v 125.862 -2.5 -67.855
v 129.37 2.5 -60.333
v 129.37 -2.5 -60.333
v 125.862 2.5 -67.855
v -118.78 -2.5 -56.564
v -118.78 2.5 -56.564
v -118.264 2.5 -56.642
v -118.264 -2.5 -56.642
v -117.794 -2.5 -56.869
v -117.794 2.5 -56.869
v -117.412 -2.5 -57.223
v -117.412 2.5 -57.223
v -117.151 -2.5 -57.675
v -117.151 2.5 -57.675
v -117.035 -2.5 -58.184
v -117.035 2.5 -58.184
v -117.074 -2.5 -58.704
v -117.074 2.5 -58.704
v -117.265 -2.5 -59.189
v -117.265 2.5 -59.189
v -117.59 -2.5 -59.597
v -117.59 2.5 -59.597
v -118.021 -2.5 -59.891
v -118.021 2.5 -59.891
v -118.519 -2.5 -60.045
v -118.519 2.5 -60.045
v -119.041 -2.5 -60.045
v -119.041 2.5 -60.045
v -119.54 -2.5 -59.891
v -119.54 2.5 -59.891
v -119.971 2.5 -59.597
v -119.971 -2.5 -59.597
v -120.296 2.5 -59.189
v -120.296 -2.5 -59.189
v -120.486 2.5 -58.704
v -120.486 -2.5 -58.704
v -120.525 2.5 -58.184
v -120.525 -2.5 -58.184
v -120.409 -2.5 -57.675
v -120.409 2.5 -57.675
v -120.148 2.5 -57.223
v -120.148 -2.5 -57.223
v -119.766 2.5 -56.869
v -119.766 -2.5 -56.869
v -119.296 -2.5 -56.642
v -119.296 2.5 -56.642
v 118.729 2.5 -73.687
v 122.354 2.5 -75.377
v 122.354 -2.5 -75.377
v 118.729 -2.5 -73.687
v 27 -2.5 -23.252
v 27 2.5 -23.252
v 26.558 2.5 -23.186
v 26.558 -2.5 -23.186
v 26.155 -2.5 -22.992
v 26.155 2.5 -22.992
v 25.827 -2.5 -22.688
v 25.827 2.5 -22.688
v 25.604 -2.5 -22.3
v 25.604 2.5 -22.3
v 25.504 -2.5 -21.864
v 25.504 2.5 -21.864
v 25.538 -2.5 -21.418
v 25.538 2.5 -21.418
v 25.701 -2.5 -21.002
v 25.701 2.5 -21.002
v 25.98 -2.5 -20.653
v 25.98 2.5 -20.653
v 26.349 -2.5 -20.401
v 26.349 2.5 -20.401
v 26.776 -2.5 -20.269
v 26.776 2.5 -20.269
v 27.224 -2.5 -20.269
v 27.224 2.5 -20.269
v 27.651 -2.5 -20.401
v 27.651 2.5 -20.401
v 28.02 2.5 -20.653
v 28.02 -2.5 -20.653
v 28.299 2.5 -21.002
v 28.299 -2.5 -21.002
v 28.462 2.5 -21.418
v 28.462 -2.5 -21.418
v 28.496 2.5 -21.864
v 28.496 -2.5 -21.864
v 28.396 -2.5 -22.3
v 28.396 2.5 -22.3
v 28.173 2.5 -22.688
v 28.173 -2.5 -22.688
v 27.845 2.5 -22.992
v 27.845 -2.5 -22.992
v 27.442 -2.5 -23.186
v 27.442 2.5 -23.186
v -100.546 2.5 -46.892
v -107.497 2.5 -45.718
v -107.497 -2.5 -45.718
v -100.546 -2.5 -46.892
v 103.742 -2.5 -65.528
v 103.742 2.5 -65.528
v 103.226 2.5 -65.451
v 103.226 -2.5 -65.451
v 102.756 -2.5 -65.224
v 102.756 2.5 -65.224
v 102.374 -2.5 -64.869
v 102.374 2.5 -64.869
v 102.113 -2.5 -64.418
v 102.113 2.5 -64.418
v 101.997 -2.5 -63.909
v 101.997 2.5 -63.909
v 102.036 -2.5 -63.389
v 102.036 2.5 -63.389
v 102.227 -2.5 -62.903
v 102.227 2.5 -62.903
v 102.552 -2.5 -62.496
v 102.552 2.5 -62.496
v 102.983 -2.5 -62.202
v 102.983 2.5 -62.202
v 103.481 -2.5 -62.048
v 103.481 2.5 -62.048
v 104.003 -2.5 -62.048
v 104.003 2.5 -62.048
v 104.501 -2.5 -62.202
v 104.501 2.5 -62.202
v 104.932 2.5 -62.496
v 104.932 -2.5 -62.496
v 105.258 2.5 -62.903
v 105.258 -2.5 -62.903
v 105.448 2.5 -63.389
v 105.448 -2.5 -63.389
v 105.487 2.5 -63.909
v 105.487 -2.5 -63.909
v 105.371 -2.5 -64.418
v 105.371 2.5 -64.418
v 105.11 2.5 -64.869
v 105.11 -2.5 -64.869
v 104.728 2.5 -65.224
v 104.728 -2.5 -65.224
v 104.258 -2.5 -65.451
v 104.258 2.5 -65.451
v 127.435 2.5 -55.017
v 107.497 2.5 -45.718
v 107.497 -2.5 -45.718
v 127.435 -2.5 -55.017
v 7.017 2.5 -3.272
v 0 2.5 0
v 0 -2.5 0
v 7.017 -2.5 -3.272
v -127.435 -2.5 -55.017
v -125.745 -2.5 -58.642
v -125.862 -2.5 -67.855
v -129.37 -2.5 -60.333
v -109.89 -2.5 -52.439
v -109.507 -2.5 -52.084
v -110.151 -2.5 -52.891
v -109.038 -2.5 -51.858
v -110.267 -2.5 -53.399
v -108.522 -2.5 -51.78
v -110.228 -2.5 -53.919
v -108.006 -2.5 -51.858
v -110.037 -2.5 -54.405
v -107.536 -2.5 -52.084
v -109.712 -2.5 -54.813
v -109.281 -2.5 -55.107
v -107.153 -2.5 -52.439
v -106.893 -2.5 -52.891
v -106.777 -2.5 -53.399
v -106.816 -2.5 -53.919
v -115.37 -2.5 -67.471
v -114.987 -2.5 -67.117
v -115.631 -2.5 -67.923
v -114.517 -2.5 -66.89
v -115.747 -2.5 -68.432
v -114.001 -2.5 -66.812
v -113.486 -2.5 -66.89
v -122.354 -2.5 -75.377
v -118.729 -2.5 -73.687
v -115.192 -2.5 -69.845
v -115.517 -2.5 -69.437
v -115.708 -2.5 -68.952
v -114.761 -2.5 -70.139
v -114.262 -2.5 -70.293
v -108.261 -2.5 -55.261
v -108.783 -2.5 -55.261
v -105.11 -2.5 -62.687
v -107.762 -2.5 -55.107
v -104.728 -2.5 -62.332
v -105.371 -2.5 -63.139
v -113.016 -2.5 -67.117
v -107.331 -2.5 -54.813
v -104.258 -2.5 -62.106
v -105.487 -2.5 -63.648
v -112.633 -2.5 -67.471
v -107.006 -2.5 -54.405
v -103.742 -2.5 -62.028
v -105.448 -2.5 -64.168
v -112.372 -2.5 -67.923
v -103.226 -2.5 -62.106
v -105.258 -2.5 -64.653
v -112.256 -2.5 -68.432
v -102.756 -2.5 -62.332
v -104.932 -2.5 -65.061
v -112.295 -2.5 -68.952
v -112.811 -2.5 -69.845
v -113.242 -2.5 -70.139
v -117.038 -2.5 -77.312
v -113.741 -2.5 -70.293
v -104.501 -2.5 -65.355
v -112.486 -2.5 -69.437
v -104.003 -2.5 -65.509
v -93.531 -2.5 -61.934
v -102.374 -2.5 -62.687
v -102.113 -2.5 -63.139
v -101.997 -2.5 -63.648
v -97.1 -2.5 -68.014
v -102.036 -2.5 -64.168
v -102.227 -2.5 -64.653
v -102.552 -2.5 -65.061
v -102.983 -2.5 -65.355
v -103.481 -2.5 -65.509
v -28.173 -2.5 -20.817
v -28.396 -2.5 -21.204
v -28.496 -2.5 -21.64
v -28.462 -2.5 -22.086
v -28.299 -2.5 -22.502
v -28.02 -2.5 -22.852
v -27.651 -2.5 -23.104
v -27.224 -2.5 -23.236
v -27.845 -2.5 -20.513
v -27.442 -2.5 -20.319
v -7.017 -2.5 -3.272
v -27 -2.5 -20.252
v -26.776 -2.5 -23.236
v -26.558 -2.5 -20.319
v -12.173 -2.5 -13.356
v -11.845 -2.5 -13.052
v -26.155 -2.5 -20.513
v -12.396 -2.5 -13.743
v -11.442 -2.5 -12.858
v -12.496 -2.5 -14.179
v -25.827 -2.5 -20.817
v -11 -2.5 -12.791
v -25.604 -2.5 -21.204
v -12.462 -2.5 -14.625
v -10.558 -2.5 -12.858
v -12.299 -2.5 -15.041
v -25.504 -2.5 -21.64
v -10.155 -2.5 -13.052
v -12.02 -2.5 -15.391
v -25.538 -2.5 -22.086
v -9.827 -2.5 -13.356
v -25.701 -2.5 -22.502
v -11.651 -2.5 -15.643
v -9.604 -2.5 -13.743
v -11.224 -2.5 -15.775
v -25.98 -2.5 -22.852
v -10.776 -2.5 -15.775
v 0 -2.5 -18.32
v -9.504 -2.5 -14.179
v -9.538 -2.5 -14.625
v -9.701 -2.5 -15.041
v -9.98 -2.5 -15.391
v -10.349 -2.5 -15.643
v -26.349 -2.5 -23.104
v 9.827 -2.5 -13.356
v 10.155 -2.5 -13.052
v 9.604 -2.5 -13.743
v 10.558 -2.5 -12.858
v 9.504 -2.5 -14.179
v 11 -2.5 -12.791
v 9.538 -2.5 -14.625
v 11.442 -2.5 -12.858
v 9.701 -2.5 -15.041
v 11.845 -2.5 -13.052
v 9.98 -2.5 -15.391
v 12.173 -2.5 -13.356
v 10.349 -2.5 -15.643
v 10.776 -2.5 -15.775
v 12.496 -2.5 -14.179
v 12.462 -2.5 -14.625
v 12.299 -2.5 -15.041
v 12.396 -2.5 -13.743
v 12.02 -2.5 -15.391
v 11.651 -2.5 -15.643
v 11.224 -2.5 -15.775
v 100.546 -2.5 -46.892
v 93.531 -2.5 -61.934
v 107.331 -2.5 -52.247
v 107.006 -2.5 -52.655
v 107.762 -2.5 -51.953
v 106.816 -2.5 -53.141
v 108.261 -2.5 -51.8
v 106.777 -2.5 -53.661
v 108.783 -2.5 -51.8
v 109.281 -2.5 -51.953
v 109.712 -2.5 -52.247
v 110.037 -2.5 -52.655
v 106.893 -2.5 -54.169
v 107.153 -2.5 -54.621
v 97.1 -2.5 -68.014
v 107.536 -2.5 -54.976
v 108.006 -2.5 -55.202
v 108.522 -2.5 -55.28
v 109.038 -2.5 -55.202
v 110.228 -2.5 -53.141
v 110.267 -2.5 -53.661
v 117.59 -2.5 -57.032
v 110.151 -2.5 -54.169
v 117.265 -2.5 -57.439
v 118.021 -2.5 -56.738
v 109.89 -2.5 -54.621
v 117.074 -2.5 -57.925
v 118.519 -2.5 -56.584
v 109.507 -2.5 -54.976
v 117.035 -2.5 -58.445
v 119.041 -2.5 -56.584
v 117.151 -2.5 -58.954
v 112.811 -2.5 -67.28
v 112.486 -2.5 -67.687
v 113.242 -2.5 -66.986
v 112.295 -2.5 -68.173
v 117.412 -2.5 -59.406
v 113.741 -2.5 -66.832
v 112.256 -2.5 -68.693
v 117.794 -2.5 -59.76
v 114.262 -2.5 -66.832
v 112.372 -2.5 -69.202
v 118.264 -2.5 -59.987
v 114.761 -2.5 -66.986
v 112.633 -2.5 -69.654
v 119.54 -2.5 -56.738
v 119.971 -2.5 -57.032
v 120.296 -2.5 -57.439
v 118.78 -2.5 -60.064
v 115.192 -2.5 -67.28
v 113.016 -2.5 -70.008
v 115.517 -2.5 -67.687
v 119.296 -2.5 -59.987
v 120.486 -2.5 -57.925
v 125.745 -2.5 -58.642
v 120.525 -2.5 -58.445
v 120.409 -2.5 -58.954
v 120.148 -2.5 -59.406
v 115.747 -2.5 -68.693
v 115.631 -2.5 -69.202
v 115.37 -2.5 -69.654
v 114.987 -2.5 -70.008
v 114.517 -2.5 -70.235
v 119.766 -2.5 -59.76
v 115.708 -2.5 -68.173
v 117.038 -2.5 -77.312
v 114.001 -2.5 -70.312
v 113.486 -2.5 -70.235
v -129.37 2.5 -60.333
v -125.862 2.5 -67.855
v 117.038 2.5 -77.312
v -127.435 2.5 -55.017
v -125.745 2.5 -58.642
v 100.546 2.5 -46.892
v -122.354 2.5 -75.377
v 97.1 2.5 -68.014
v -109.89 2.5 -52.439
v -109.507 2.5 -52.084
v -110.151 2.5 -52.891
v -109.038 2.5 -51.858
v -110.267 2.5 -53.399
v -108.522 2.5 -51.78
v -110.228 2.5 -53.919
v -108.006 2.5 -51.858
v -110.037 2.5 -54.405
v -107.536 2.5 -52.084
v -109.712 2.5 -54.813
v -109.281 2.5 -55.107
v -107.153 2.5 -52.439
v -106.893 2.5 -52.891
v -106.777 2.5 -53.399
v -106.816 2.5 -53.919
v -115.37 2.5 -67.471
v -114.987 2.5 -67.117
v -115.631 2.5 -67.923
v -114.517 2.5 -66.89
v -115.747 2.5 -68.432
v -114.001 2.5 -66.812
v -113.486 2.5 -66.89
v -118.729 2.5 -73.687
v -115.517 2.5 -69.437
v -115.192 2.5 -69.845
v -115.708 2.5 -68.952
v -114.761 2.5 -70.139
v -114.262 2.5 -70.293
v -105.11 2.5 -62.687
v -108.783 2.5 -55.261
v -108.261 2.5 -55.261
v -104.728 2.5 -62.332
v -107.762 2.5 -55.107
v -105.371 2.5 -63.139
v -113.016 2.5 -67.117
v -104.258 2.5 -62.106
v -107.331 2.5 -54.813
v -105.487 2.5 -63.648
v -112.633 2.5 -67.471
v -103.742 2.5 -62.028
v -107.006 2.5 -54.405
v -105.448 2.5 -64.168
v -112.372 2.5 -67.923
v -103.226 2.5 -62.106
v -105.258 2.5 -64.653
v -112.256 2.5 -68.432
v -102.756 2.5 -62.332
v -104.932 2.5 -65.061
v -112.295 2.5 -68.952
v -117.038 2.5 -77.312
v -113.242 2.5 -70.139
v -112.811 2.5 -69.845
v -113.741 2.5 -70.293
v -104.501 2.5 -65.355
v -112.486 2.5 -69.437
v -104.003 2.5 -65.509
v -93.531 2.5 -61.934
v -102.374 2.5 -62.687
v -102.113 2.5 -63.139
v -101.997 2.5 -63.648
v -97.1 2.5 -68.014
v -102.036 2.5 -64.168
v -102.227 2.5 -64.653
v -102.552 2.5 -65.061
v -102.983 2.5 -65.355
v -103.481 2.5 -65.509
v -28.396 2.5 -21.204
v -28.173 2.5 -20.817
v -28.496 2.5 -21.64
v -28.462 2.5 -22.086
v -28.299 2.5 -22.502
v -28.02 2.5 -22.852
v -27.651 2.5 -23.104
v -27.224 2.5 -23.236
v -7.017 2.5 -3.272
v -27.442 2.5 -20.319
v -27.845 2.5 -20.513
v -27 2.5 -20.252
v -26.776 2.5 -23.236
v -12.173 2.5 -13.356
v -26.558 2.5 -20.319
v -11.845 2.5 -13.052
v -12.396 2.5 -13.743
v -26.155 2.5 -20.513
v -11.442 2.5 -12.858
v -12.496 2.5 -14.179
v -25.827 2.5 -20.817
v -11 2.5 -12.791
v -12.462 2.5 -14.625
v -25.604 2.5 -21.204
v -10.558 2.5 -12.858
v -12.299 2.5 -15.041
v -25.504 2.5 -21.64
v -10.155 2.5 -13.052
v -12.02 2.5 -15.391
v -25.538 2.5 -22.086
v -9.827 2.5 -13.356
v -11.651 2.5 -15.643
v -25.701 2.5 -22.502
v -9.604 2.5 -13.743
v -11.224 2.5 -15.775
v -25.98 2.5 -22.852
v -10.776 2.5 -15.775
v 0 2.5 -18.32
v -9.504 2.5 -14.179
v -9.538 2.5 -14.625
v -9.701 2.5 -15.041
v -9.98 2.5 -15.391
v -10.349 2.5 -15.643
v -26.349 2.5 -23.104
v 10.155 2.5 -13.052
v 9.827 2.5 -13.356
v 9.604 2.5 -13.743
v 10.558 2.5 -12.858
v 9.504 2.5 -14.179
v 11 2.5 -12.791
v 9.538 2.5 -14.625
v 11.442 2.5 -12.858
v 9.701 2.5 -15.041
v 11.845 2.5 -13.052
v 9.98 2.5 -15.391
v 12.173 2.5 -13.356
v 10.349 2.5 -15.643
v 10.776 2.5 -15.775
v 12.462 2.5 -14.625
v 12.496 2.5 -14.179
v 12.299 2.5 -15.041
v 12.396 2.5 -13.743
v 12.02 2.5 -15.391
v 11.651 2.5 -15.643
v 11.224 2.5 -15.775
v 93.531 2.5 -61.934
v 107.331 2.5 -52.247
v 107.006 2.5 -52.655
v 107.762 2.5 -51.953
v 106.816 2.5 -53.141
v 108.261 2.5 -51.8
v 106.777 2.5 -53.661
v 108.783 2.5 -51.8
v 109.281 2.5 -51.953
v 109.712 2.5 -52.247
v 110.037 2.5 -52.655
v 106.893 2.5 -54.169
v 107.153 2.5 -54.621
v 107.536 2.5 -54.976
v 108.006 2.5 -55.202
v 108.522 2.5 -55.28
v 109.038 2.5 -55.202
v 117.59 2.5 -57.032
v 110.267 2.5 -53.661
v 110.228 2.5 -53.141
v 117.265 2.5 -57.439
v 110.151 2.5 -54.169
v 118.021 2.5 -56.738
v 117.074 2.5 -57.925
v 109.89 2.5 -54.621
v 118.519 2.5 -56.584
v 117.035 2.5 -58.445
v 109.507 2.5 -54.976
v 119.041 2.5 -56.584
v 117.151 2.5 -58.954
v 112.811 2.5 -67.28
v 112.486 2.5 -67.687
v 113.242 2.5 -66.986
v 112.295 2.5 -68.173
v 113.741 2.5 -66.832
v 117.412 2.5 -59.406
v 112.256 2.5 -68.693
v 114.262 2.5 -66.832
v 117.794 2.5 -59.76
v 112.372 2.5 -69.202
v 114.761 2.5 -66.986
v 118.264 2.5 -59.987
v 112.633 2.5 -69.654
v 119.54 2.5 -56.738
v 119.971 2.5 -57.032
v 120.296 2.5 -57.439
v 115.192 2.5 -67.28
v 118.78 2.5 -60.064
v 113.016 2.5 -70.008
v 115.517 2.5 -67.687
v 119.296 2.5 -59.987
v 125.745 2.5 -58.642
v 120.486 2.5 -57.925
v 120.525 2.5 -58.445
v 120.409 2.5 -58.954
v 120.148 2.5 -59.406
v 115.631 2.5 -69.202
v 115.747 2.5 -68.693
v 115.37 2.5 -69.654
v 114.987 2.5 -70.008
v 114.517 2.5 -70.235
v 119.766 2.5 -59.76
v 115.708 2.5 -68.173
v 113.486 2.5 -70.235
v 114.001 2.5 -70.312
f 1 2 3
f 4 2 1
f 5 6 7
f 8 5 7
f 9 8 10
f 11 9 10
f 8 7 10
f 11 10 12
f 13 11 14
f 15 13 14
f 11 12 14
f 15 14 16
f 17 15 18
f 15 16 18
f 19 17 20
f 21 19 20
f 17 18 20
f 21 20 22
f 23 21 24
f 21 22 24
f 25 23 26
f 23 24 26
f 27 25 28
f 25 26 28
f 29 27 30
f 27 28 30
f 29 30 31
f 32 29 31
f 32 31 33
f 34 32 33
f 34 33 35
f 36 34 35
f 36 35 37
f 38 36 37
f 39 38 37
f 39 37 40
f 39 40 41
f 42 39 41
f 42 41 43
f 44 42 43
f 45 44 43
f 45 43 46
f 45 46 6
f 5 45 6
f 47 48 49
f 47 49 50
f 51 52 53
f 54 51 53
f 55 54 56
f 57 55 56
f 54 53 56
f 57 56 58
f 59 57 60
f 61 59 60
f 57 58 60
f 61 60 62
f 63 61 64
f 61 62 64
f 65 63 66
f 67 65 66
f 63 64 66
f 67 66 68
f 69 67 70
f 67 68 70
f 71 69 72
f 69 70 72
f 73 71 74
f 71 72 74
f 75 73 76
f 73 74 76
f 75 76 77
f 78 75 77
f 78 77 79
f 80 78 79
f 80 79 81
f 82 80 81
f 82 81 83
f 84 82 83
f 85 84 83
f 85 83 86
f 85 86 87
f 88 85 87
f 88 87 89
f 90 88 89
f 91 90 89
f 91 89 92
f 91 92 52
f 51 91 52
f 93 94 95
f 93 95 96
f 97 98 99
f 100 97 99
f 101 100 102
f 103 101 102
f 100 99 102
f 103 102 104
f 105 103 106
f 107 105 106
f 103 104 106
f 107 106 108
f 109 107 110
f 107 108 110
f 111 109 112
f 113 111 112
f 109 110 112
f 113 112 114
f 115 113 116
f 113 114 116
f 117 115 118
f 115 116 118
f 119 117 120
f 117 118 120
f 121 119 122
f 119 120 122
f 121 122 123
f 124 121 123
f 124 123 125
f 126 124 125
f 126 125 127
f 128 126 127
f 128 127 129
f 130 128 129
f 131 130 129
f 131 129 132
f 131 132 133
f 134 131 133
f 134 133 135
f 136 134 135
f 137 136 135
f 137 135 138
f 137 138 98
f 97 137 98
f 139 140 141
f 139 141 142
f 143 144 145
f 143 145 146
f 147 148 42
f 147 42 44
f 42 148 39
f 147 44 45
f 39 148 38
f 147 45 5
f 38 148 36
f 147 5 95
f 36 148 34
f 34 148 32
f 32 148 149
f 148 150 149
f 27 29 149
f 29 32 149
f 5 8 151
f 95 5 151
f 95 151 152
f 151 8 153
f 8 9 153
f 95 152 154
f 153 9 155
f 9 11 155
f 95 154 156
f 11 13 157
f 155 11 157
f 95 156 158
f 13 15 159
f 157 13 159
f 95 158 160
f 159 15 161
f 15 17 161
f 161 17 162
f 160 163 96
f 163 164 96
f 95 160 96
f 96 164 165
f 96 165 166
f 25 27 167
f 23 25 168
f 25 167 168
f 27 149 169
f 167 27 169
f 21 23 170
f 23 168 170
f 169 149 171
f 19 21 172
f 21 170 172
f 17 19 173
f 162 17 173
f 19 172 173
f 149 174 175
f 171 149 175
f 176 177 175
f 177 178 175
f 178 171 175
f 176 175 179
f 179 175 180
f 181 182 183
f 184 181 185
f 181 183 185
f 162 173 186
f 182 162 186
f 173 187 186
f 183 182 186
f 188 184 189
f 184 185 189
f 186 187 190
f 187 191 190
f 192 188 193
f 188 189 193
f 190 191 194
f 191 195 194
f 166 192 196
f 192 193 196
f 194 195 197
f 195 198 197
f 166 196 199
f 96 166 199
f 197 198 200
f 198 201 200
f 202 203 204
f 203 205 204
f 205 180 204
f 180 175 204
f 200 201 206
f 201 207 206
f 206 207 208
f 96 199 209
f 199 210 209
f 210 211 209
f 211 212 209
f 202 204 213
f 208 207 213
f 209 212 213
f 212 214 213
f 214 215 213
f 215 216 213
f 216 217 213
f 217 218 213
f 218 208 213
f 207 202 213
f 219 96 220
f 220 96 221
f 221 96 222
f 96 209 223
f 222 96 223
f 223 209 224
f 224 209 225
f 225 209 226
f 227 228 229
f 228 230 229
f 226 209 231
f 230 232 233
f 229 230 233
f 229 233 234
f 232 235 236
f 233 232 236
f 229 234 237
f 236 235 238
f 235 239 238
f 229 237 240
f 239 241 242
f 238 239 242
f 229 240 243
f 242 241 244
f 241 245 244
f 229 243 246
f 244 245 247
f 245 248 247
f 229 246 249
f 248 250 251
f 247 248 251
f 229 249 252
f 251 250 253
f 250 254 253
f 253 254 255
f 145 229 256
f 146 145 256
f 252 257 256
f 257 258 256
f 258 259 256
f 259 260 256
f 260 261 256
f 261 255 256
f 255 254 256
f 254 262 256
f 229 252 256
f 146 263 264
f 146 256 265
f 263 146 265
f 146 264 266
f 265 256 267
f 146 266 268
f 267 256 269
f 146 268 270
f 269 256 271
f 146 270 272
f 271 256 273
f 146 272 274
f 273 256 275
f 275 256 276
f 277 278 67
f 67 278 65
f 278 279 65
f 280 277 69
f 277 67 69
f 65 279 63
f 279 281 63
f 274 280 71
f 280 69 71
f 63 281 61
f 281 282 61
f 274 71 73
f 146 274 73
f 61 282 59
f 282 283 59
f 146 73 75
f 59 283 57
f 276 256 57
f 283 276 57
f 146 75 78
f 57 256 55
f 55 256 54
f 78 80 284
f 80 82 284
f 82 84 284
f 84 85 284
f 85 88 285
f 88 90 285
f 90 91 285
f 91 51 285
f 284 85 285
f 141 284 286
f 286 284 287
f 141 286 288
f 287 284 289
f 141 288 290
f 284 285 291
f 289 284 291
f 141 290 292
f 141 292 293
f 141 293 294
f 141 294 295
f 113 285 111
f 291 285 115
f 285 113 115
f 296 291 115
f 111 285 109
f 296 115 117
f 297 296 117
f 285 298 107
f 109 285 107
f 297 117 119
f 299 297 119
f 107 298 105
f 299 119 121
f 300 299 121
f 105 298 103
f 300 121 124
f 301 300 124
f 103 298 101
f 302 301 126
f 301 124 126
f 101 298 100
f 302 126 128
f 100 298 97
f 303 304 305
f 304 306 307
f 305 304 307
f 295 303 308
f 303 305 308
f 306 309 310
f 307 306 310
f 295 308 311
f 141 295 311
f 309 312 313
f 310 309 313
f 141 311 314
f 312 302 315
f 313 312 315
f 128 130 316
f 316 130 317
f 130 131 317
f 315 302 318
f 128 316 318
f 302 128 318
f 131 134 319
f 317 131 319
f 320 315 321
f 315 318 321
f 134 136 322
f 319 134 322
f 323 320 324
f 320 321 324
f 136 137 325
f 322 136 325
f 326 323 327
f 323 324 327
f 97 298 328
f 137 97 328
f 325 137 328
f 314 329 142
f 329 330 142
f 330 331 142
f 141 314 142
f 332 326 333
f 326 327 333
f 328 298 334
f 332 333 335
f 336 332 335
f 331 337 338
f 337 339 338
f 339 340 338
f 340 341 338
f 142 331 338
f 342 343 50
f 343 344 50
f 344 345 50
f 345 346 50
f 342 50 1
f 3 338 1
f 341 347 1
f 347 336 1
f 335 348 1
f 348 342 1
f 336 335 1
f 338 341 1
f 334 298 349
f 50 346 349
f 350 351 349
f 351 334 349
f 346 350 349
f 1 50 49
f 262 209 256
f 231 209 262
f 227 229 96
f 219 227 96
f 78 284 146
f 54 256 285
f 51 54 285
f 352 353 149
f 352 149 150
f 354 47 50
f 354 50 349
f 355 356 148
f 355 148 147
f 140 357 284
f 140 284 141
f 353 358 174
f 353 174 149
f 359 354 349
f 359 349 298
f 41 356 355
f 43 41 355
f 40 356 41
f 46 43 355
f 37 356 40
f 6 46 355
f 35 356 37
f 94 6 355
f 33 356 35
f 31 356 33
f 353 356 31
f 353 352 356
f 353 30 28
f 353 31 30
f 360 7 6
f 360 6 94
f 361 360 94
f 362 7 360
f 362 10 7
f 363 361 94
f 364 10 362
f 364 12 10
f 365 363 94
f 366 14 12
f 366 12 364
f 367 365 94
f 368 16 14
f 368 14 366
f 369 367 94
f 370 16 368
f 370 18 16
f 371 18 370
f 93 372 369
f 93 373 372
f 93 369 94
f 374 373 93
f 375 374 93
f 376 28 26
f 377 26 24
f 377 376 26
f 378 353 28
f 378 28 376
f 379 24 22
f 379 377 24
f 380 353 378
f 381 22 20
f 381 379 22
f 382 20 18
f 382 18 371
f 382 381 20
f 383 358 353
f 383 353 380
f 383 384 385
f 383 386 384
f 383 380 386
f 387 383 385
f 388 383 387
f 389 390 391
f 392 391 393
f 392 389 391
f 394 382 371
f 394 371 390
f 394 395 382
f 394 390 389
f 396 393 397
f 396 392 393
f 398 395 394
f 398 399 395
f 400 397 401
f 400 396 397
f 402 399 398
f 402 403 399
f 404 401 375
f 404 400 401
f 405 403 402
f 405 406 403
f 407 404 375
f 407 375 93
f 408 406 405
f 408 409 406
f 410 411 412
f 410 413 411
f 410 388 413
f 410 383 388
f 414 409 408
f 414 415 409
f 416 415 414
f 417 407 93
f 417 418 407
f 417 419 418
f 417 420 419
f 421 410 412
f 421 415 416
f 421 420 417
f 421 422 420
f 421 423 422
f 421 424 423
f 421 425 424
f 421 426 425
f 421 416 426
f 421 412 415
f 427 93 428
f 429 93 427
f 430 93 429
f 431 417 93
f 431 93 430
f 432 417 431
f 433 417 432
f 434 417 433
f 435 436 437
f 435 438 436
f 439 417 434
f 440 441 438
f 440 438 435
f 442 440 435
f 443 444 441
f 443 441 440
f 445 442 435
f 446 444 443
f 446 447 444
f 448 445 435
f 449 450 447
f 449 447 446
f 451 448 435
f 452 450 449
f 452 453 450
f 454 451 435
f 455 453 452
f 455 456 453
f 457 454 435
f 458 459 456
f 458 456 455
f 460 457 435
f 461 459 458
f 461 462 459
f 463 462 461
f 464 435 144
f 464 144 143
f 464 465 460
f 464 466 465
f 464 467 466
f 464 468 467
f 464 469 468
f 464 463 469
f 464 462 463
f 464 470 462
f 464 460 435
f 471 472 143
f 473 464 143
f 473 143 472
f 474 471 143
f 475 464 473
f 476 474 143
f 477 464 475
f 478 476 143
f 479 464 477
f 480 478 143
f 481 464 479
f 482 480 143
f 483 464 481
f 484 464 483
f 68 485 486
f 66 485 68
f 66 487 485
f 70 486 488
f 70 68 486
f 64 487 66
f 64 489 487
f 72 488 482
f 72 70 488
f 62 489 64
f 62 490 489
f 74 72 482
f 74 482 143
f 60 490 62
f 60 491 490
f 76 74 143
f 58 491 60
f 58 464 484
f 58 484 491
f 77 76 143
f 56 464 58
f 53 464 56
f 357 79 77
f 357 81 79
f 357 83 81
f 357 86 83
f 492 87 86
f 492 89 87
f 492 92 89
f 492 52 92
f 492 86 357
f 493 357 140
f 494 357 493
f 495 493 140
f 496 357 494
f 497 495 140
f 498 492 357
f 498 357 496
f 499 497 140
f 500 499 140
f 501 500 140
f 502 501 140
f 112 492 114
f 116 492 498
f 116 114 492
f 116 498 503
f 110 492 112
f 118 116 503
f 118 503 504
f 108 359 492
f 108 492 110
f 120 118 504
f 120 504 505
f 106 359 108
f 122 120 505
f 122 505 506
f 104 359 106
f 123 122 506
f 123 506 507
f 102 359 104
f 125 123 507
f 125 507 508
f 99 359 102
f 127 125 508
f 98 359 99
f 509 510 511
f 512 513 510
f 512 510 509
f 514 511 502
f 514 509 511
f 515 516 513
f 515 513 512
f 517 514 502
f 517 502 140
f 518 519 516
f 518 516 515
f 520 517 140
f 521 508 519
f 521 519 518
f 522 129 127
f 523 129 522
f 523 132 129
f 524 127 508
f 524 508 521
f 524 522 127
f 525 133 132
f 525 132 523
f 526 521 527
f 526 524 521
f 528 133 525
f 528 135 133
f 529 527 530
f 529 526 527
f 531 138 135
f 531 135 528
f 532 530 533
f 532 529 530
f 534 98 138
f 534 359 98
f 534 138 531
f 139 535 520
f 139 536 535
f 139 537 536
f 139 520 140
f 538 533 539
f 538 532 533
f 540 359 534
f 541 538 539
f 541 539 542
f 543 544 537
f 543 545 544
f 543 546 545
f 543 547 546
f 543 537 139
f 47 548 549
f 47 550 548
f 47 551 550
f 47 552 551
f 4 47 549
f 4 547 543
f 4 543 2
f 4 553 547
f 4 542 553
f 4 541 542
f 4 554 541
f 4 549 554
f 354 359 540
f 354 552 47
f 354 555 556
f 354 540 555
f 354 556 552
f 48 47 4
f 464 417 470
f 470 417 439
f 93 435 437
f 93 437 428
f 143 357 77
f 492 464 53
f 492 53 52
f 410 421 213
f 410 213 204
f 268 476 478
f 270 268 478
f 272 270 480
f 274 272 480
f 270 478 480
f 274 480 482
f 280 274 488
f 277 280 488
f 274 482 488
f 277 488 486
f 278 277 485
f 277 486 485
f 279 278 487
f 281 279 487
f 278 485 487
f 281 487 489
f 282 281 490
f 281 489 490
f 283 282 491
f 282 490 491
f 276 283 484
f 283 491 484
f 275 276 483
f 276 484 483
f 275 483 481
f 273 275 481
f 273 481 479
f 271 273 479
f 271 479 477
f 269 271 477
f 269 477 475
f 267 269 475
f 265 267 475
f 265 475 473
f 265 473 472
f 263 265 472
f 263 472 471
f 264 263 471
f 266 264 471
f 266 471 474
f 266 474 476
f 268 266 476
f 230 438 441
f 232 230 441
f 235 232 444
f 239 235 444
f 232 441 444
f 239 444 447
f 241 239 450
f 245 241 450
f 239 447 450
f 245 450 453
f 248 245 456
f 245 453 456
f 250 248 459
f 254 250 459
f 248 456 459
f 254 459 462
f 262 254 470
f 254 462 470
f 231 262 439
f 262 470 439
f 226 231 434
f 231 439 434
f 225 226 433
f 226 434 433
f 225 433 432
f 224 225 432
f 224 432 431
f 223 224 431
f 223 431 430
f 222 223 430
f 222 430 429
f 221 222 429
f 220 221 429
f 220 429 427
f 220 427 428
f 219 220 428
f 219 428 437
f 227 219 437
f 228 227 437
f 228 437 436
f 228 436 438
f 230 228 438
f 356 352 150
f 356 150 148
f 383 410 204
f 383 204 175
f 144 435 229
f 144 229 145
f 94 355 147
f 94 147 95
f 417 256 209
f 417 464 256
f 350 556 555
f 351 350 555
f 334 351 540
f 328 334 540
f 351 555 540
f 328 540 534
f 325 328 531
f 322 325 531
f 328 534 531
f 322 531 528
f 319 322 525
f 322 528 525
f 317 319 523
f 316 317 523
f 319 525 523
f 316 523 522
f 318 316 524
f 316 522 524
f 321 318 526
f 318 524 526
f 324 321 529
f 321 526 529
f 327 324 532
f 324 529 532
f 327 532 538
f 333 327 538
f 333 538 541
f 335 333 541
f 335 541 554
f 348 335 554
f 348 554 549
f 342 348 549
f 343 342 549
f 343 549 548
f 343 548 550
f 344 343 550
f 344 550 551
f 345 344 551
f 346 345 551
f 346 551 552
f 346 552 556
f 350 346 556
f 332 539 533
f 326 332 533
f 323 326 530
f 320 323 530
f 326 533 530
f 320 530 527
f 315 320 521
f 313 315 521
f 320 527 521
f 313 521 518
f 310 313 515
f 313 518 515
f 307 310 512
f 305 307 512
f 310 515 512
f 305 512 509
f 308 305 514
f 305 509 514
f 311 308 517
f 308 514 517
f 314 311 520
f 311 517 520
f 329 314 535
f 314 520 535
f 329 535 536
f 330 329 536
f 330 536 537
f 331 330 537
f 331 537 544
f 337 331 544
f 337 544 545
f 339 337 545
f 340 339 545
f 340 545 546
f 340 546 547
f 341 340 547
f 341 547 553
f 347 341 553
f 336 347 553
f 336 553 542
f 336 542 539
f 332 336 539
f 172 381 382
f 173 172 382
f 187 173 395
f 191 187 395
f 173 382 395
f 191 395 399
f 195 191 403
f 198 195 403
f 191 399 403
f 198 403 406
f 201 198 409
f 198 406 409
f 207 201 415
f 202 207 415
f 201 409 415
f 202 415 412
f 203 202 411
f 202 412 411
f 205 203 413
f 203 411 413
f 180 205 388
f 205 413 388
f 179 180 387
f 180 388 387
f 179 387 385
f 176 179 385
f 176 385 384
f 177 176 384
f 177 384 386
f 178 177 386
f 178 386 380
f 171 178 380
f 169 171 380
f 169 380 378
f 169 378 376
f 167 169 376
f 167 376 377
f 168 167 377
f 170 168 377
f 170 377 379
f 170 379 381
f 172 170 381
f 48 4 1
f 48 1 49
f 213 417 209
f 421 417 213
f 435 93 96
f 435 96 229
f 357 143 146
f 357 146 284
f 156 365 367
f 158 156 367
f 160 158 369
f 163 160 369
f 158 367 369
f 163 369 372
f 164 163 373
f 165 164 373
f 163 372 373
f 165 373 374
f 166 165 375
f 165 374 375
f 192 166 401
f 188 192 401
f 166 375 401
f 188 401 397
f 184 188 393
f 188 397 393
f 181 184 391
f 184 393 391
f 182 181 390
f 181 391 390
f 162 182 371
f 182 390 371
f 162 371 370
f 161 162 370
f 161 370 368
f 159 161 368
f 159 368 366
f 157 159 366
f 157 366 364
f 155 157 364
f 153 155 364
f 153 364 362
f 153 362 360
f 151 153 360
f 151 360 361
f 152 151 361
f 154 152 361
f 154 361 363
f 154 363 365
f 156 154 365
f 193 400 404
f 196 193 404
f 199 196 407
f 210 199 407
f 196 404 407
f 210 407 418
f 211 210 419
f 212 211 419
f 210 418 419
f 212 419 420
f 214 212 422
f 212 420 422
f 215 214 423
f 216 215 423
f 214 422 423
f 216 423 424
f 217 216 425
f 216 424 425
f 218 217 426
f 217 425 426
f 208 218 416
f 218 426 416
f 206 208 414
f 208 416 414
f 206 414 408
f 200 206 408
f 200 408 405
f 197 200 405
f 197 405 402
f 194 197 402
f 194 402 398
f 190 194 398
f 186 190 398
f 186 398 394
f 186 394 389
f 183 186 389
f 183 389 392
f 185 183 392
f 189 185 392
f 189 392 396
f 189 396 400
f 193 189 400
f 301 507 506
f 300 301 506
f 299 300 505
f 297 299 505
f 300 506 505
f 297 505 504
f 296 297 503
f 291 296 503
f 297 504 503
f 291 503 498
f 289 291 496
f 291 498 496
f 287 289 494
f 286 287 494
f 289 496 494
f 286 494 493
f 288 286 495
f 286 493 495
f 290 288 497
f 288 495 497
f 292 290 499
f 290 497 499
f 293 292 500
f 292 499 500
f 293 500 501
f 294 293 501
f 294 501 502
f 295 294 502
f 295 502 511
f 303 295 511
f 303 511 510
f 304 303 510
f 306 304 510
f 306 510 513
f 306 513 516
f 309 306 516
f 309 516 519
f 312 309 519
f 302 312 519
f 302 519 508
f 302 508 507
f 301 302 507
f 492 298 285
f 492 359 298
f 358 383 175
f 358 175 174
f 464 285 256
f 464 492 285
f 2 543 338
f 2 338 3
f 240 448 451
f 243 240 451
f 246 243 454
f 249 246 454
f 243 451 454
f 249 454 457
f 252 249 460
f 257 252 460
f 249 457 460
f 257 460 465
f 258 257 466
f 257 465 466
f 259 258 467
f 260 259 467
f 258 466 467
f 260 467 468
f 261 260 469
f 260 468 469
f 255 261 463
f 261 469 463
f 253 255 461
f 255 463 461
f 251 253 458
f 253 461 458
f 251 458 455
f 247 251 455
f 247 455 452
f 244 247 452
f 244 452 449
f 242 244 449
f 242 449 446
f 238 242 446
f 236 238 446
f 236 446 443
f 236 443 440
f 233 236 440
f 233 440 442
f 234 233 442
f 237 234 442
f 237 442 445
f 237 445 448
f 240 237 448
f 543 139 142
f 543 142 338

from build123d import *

# Parameters (mm, degrees)
BOSS_EXTRUDE1_DEPTH = 2.5
SKETCH2_R           = 1.5
CUT_EXTRUDE1_DEPTH  = 151.793609014
SKETCH3_R           = 1.75
CUT_EXTRUDE2_DEPTH  = 151.793609014


with BuildPart() as part:
    # Sketch1 → Boss-Extrude1 (new, symmetric)
    with BuildSketch(Plane(origin=(0, 0, 0), x_dir=(1, 0, 0), z_dir=(0, 1, 0))):
        Polygon((0, 18.32), (-93.530963622, 61.934204612), (-97.099562891, 68.014303234), (-117.038334206, 77.311904992), (-118.728807253, 73.686673844), (-122.354038401, 75.377146891), (-125.861769973, 67.854792259), (-129.369941895, 60.33264298), (-125.744809712, 58.641957717), (-127.435494976, 55.016825534), (-107.497267972, 45.718056586), (-100.545722072, 46.892156069), (-7.017311764, 3.272476275), (0, 0), (7.017311764, 3.272476275), (100.545722072, 46.892156069), (107.497267972, 45.718056586), (127.435494976, 55.016825534), (125.744809712, 58.641957717), (129.369941895, 60.33264298), (125.861769973, 67.854792259), (122.354038401, 75.377146891), (118.728807253, 73.686673844), (117.038334206, 77.311904992), (97.099562891, 68.014303234), (93.530963622, 61.934204612), align=None)
    extrude(amount=BOSS_EXTRUDE1_DEPTH, both=True)

    # Sketch2 → Cut-Extrude1 (cut, through all)
    with BuildSketch(Plane(origin=(0, 2.5, 0), x_dir=(1, 0, 0), z_dir=(0, 1, 0))):
        with Locations(Location((-11, 14.291347512, 0), (0, 0, 270))):
            Circle(SKETCH2_R)
        with Locations(Location((11, 14.291347512, 0), (0, 0, 270))):
            Circle(SKETCH2_R)
        with Locations(Location((-27, 21.752270043, 0), (0, 0, 270))):
            Circle(SKETCH2_R)
        with Locations(Location((27, 21.752270043, 0), (0, 0, 90))):
            Circle(SKETCH2_R)
    extrude(amount=-CUT_EXTRUDE1_DEPTH, mode=Mode.SUBTRACT)

    # Sketch3 → Cut-Extrude2 (cut, through all)
    with BuildSketch(Plane(origin=(0, 2.5, 0), x_dir=(1, 0, 0), z_dir=(0, 1, 0))):
        with Locations(Location((-114.001493892, 68.562429851, 0), (0, 0, 270))):
            Circle(SKETCH3_R)
        with Locations(Location((-118.780213306, 58.314432997, 0), (0, 0, 270))):
            Circle(SKETCH3_R)
        with Locations(Location((-103.742089693, 63.778391104, 0), (0, 0, 270))):
            Circle(SKETCH3_R)
        with Locations(Location((-108.521689093, 53.530073465, 0), (0, 0, 270))):
            Circle(SKETCH3_R)
        with Locations(Location((103.742089693, 63.778391104, 0), (0, 0, 90))):
            Circle(SKETCH3_R)
        with Locations(Location((108.521689093, 53.530073465, 0), (0, 0, 90))):
            Circle(SKETCH3_R)
        with Locations(Location((118.780213306, 58.314432997, 0), (0, 0, 90))):
            Circle(SKETCH3_R)
        with Locations(Location((114.001493892, 68.562429851, 0), (0, 0, 90))):
            Circle(SKETCH3_R)
    extrude(amount=-CUT_EXTRUDE2_DEPTH, mode=Mode.SUBTRACT)


solid = part.part
